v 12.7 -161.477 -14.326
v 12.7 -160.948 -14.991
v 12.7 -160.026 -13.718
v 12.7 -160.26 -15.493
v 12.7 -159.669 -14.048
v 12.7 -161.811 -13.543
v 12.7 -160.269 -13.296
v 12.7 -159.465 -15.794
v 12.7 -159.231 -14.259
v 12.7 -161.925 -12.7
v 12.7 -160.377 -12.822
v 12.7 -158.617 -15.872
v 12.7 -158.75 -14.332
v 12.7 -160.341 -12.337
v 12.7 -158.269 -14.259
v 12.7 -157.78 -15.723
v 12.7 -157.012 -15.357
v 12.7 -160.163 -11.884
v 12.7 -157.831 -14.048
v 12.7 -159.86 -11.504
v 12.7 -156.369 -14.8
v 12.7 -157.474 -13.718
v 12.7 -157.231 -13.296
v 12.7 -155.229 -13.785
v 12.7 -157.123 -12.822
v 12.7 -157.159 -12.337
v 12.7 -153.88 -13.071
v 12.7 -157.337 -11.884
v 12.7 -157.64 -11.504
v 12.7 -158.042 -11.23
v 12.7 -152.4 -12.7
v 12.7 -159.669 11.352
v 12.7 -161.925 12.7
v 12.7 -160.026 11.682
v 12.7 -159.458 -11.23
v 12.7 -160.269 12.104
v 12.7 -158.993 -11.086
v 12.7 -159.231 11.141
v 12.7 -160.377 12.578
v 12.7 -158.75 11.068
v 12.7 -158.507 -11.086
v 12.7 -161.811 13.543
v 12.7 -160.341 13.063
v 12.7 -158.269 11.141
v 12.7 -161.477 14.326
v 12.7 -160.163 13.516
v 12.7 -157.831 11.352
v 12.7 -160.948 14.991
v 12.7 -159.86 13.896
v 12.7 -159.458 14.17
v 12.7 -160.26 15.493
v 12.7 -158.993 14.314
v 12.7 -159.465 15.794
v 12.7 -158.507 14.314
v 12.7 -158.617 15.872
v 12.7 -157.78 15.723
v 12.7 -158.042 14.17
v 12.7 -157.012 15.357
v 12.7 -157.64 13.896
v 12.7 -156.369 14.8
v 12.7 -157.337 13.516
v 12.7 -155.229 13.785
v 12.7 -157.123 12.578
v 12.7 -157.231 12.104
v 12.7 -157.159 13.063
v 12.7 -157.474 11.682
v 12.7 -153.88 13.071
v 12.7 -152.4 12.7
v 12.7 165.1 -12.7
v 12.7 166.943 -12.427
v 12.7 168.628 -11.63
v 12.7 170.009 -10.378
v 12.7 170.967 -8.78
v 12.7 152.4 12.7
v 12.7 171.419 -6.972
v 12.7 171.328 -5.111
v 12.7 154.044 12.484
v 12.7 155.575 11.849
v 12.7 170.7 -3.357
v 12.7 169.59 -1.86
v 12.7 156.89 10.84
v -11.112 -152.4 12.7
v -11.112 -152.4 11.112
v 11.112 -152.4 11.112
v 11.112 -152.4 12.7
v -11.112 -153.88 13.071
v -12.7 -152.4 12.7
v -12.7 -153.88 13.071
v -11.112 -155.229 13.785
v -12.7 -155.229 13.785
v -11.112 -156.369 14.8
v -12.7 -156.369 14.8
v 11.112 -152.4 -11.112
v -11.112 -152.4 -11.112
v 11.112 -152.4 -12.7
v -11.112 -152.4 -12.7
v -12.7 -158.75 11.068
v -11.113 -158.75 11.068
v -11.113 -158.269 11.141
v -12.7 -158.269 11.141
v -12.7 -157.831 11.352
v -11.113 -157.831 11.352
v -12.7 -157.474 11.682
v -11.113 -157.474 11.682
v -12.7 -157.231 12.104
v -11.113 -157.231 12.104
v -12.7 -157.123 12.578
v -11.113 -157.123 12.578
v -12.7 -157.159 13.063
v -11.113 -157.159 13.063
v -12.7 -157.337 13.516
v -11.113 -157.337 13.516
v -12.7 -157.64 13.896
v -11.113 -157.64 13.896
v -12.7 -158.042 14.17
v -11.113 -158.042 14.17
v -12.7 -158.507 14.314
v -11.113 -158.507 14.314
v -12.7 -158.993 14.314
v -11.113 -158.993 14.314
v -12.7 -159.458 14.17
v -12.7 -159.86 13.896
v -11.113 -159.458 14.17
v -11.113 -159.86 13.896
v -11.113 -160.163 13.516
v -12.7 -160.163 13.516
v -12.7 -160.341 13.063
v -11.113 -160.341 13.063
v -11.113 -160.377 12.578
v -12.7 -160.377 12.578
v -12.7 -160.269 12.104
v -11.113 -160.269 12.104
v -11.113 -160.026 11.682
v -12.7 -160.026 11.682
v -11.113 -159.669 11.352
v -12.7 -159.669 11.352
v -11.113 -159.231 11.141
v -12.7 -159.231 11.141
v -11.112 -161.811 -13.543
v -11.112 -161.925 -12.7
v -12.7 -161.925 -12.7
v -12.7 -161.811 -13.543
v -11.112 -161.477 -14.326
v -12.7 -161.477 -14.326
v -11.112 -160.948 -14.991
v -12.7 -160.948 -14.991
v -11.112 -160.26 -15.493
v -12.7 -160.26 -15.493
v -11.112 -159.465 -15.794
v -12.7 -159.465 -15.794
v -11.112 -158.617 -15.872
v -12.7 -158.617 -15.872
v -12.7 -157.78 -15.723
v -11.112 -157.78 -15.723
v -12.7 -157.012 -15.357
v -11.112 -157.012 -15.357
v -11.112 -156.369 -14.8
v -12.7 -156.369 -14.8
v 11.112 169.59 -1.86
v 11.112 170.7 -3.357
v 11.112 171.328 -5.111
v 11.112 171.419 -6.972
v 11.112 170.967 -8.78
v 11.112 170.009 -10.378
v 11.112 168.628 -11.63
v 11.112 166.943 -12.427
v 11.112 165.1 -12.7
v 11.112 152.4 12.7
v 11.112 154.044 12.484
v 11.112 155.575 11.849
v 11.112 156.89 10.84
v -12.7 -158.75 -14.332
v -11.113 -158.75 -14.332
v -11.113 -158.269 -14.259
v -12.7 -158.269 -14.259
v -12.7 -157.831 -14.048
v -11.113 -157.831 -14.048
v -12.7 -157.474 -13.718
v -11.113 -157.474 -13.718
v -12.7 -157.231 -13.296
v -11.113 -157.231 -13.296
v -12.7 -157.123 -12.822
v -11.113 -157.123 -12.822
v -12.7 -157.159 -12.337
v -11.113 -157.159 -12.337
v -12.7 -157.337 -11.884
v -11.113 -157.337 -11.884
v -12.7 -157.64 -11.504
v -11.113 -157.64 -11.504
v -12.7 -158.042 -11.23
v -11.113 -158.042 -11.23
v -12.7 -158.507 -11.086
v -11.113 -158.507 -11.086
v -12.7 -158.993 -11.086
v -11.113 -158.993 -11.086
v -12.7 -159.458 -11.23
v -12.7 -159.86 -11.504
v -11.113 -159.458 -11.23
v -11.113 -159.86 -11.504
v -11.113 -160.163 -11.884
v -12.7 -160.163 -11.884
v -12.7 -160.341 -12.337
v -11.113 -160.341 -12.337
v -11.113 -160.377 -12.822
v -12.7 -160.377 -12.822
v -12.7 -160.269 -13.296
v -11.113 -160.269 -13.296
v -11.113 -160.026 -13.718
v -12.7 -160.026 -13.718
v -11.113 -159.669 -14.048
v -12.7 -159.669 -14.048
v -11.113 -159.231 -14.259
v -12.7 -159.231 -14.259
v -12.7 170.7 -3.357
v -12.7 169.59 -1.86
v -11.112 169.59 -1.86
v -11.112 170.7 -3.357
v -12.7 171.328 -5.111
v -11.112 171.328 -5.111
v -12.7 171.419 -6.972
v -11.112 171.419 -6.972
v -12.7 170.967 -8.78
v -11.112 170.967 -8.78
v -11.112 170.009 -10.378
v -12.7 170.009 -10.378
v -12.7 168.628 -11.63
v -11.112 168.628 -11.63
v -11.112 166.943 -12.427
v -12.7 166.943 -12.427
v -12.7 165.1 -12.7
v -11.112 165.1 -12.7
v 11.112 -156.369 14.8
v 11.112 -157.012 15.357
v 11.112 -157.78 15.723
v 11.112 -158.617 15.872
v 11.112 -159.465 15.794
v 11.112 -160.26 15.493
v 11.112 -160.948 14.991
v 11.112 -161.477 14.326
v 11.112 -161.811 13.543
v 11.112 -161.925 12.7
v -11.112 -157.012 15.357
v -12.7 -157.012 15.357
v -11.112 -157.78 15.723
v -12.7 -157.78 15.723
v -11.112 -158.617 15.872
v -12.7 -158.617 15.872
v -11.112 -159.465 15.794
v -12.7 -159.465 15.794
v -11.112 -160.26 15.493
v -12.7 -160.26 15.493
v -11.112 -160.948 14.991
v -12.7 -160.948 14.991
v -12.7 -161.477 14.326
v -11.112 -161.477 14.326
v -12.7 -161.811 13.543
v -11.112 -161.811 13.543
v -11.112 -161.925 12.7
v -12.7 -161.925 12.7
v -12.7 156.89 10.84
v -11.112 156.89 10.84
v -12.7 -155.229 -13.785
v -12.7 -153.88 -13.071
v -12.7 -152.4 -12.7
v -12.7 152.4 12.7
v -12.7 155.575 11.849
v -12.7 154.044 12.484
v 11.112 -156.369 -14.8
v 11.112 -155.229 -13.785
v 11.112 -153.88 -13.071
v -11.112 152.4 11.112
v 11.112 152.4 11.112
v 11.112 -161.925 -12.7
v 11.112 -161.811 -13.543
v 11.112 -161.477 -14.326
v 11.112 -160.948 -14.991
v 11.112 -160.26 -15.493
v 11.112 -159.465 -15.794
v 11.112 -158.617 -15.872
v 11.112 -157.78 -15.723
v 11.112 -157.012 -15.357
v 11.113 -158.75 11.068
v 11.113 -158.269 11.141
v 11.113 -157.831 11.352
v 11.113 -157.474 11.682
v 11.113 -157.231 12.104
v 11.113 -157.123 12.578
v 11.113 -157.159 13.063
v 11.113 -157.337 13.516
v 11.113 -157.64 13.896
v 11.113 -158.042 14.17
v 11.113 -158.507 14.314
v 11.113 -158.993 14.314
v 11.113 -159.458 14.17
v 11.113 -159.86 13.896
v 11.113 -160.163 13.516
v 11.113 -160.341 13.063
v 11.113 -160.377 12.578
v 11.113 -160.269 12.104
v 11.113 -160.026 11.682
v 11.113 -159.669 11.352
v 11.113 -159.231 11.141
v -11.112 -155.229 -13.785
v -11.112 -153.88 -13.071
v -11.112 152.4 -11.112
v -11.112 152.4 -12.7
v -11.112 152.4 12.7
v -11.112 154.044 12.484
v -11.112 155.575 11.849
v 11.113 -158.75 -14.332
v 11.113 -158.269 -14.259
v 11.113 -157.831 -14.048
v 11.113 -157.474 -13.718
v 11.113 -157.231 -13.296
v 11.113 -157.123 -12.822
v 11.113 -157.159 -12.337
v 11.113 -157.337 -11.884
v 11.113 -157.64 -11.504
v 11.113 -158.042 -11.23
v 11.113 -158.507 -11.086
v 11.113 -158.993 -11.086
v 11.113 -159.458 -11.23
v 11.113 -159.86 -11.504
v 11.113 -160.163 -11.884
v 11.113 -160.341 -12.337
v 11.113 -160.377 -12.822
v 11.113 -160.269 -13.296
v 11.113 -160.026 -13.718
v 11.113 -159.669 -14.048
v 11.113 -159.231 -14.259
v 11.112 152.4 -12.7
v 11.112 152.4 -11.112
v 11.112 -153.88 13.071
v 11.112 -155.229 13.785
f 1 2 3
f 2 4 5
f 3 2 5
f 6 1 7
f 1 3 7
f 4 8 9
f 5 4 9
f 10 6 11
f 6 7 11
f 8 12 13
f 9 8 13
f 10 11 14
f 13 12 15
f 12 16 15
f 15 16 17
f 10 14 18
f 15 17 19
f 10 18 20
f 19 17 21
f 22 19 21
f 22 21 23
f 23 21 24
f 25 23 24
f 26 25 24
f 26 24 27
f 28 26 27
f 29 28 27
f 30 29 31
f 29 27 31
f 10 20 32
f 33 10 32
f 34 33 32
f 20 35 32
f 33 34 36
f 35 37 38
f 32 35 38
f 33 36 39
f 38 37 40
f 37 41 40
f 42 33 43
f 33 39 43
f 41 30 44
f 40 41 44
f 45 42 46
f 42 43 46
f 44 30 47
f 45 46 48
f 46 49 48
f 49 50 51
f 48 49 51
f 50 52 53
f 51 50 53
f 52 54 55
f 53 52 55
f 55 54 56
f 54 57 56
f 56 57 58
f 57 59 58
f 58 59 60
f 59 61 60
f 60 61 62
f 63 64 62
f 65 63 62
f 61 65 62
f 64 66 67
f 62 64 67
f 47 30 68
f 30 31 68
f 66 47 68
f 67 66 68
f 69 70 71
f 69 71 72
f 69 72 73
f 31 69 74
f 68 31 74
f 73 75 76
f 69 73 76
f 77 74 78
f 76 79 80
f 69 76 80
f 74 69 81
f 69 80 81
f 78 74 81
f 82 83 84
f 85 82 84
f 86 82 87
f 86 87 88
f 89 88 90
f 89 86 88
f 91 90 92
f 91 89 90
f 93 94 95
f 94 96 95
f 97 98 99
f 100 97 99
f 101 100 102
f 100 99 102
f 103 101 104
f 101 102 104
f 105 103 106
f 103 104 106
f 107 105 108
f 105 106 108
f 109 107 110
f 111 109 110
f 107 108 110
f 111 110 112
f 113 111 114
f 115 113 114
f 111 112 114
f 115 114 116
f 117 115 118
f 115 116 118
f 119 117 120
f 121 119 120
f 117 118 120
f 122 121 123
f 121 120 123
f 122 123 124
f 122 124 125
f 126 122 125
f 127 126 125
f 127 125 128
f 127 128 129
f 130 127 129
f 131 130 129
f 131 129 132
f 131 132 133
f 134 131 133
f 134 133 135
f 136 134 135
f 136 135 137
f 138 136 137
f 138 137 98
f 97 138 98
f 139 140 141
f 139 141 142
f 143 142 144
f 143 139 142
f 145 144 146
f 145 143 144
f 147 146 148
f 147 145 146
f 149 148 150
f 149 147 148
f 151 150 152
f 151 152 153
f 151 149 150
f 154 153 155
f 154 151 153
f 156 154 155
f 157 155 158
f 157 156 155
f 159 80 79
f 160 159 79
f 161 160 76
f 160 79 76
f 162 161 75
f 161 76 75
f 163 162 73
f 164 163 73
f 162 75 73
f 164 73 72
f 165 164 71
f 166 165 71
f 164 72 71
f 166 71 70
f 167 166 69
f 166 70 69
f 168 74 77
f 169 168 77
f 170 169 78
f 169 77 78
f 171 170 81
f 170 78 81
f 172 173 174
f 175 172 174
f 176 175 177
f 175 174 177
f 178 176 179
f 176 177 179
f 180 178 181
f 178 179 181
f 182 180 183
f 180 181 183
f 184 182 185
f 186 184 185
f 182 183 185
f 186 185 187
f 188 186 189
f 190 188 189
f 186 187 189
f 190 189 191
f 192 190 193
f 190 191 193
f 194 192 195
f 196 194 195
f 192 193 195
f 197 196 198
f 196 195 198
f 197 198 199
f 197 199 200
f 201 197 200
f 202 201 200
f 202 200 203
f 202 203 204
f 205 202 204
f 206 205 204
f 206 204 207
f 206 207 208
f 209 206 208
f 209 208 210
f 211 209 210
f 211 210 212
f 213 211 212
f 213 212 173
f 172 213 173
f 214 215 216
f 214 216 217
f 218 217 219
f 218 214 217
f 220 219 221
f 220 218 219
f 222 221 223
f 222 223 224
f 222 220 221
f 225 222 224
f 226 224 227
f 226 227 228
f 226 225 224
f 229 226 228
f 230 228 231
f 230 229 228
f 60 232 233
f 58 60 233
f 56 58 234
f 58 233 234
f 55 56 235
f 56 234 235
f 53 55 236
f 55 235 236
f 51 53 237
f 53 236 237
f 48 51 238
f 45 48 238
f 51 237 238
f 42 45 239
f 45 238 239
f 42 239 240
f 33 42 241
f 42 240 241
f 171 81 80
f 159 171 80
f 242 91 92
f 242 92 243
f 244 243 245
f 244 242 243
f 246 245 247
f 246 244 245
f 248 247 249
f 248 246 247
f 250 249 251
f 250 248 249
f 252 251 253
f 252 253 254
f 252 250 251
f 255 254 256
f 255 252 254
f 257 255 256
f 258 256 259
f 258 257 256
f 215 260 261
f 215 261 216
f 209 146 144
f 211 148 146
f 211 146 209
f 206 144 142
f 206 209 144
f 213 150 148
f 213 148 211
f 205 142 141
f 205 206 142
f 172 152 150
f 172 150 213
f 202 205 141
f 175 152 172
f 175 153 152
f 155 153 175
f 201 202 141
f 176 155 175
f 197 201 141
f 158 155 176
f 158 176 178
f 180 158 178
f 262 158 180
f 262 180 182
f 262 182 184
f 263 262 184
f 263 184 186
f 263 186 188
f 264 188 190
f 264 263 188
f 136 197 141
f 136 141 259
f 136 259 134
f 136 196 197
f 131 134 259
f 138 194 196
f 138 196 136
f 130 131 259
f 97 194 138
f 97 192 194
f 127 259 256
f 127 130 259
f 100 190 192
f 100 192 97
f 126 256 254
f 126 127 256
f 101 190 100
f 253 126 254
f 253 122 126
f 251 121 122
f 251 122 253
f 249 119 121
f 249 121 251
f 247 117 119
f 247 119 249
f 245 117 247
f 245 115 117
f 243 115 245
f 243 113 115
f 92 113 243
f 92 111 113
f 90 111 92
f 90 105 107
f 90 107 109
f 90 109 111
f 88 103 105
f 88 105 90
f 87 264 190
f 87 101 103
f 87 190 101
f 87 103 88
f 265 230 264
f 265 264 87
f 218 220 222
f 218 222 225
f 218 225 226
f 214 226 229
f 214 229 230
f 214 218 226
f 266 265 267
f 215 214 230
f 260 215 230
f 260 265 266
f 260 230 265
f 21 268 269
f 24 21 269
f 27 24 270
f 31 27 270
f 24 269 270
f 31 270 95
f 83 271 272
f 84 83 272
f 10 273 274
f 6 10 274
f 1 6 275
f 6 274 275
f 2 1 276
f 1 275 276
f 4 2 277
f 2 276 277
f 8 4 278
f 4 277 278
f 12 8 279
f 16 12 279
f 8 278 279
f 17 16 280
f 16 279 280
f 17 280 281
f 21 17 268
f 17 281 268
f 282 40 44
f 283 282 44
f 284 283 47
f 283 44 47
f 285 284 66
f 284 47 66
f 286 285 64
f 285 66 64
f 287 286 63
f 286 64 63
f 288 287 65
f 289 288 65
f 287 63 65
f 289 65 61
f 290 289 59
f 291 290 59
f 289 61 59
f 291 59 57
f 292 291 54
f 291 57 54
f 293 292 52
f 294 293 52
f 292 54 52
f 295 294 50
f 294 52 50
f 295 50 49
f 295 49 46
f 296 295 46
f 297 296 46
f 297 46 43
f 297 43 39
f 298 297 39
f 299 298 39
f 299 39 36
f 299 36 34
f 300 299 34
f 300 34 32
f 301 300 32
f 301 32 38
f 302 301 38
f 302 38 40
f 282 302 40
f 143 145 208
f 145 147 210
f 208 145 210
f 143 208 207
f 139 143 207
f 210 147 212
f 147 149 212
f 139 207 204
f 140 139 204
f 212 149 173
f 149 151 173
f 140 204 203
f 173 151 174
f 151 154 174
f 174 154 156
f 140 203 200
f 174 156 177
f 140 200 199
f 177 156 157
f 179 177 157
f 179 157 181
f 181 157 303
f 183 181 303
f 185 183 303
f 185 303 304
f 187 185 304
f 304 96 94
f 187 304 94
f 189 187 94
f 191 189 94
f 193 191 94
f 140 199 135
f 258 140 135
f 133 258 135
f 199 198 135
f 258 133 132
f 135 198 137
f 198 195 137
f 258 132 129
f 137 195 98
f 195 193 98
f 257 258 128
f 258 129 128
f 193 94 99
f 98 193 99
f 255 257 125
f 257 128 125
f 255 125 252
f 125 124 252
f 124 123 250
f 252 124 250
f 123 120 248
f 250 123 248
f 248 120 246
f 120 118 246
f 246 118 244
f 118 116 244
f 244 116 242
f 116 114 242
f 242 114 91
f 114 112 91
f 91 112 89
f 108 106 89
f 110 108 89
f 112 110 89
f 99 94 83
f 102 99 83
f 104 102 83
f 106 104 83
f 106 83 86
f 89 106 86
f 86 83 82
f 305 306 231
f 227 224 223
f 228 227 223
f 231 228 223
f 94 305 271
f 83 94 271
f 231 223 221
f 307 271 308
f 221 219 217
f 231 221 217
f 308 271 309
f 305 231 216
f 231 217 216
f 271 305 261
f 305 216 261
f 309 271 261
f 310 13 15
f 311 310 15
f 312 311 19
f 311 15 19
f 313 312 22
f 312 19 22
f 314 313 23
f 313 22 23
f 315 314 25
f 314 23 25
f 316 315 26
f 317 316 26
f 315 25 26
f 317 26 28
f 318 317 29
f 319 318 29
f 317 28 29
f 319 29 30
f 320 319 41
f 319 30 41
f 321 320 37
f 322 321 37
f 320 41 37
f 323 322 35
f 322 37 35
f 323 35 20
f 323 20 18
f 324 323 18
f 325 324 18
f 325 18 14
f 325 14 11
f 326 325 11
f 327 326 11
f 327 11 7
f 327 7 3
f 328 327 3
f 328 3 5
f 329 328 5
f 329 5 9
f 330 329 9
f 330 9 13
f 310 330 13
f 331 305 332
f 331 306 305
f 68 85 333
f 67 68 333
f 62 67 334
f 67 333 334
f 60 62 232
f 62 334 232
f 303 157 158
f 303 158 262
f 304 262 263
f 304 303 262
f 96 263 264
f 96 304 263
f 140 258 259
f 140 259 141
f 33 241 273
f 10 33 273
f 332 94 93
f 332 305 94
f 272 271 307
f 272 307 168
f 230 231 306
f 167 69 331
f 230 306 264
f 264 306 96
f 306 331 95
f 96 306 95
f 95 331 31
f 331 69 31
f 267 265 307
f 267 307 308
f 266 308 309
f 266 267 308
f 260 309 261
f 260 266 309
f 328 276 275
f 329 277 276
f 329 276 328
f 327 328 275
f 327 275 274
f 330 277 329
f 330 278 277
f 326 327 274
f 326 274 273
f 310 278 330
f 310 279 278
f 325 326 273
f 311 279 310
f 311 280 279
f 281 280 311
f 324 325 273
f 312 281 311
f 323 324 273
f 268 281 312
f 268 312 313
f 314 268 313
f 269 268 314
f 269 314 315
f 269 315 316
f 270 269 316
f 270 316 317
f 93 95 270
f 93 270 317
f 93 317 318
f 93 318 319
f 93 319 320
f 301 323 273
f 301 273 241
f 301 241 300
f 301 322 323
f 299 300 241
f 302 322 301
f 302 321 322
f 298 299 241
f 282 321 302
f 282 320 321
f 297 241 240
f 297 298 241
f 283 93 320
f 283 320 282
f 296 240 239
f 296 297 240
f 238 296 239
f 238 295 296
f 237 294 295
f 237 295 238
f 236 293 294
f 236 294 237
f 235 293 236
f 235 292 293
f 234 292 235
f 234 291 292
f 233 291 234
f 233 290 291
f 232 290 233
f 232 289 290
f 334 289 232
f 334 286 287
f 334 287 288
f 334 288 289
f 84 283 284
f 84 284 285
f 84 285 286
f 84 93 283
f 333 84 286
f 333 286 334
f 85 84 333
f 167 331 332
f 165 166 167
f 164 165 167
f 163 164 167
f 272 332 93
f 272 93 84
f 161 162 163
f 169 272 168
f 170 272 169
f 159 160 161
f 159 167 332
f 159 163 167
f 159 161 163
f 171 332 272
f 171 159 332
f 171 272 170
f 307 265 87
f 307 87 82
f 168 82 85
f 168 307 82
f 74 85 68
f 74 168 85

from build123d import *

# Parameters (mm, degrees)
SKETCH1_W             = 25.4
SKETCH1_H             = 25.4
SKETCH1_W_2           = 22.225
SKETCH1_H_2           = 22.225
EXTRUDE_THIN1_DEPTH   = 152.4
BOSS_EXTRUDE1_DEPTH   = 1.5875
BOSS_EXTRUDE2_START   = 22.225
BOSS_EXTRUDE2_DEPTH   = 1.5875
F_4_CLEARANCE_HOLE1_D = 3.2639
SKETCH11_R            = 6.35
BOSS_EXTRUDE3_DEPTH   = 1.5875
BOSS_EXTRUDE4_START   = -25.4
SKETCH11_3_R          = 6.35
BOSS_EXTRUDE4_DEPTH   = 1.5875


# Read off the part's stored shape, not the designer's step: Boss-Extrude2
with BuildPart() as part:
    # Sketch1 → Extrude-Thin1 (new, symmetric)
    with BuildSketch(Plane(origin=(0, 0, 0), x_dir=(1, 0, 0), z_dir=(0, 1, 0))):
        Rectangle(SKETCH1_W, SKETCH1_H)
        Rectangle(SKETCH1_W_2, SKETCH1_H_2, mode=Mode.SUBTRACT)
    extrude(amount=EXTRUDE_THIN1_DEPTH, both=True)

    # Sketch3 → Boss-Extrude1 (add)
    with BuildSketch(Plane(origin=(-11.1125, 0, 0), x_dir=(0, 0, -1), z_dir=(1, 0, 0))):
        with BuildLine():
            ThreePointArc((12.7, -161.925), (15.669940551, -159.872532015), (14.800065103, -156.36875))
            ThreePointArc((14.800065103, -156.36875), (13.387535234, -154.576190551), (12.7, -152.4))
            Line((12.7, -152.4), (-12.7, -152.4))
            ThreePointArc((-12.7, -152.4), (-13.387535234, -154.576190551), (-14.800065103, -156.36875))
            ThreePointArc((-14.800065103, -156.36875), (-15.669940551, -159.872532015), (-12.7, -161.925))
            Line((-12.7, -161.925), (12.7, -161.925))
        make_face()
    extrude(amount=-BOSS_EXTRUDE1_DEPTH)

    # Boss-Extrude2 outline → Boss-Extrude2 (add)
    with BuildSketch(Plane(origin=(-11.1125, 0, 0), x_dir=(0, 0, -1), z_dir=(1, 0, 0)).offset(BOSS_EXTRUDE2_START)):
        with BuildLine():
            Line((-12.7, -161.925), (12.7, -161.925))
            ThreePointArc((12.7, -161.925), (15.669940551, -159.872532015), (14.800065103, -156.36875))
            ThreePointArc((14.800065103, -156.36875), (13.387535234, -154.576190551), (12.7, -152.4))
            Line((12.7, -152.4), (-12.7, -152.4))
            ThreePointArc((-12.7, -152.4), (-13.387535234, -154.576190551), (-14.800065103, -156.36875))
            ThreePointArc((-14.800065103, -156.36875), (-15.669940551, -159.872532015), (-12.7, -161.925))
        make_face()
    extrude(amount=BOSS_EXTRUDE2_DEPTH)

    # #4 Clearance Hole1 (through all)
    with Locations(Plane.ZY.offset(12.7)):
        with Locations((-12.7, -158.75), (12.7, -158.75)):
            Hole(F_4_CLEARANCE_HOLE1_D / 2)

    # Sketch11 → Boss-Extrude3 (add)
    with BuildSketch(Plane.ZY.offset(12.7)):
        with Locations((-6.35, 165.1)):
            Circle(SKETCH11_R)
        with BuildLine():
            Line((10.840128061, 156.890128061), (-1.859871939, 169.590128061))
            ThreePointArc((-1.859871939, 169.590128061), (-0.483364969, 167.530039796), (0, 165.1))
            ThreePointArc((0, 165.1), (-6.35, 158.75), (-12.7, 165.1))
            Line((-12.7, 165.1), (-12.7, 152.4))
            Line((-12.7, 152.4), (12.7, 152.4))
            ThreePointArc((12.7, 152.4), (12.216635031, 154.830039796), (10.840128061, 156.890128061))
        make_face()
    extrude(amount=-BOSS_EXTRUDE3_DEPTH)

    # Sketch11<3> → Boss-Extrude4 (add)
    with BuildSketch(Plane.ZY.offset(12.7).offset(BOSS_EXTRUDE4_START)):
        with BuildLine():
            Line((10.840128061, 156.890128061), (-1.859871939, 169.590128061))
            ThreePointArc((-1.859871939, 169.590128061), (-0.483364969, 167.530039796), (0, 165.1))
            ThreePointArc((0, 165.1), (-6.35, 158.75), (-12.7, 165.1))
            Line((-12.7, 165.1), (-12.7, 152.4))
            Line((-12.7, 152.4), (12.7, 152.4))
            ThreePointArc((12.7, 152.4), (12.216635031, 154.830039796), (10.840128061, 156.890128061))
        make_face()
        with Locations((-6.35, 165.1)):
            Circle(SKETCH11_3_R)
    extrude(amount=BOSS_EXTRUDE4_DEPTH)


solid = part.part
